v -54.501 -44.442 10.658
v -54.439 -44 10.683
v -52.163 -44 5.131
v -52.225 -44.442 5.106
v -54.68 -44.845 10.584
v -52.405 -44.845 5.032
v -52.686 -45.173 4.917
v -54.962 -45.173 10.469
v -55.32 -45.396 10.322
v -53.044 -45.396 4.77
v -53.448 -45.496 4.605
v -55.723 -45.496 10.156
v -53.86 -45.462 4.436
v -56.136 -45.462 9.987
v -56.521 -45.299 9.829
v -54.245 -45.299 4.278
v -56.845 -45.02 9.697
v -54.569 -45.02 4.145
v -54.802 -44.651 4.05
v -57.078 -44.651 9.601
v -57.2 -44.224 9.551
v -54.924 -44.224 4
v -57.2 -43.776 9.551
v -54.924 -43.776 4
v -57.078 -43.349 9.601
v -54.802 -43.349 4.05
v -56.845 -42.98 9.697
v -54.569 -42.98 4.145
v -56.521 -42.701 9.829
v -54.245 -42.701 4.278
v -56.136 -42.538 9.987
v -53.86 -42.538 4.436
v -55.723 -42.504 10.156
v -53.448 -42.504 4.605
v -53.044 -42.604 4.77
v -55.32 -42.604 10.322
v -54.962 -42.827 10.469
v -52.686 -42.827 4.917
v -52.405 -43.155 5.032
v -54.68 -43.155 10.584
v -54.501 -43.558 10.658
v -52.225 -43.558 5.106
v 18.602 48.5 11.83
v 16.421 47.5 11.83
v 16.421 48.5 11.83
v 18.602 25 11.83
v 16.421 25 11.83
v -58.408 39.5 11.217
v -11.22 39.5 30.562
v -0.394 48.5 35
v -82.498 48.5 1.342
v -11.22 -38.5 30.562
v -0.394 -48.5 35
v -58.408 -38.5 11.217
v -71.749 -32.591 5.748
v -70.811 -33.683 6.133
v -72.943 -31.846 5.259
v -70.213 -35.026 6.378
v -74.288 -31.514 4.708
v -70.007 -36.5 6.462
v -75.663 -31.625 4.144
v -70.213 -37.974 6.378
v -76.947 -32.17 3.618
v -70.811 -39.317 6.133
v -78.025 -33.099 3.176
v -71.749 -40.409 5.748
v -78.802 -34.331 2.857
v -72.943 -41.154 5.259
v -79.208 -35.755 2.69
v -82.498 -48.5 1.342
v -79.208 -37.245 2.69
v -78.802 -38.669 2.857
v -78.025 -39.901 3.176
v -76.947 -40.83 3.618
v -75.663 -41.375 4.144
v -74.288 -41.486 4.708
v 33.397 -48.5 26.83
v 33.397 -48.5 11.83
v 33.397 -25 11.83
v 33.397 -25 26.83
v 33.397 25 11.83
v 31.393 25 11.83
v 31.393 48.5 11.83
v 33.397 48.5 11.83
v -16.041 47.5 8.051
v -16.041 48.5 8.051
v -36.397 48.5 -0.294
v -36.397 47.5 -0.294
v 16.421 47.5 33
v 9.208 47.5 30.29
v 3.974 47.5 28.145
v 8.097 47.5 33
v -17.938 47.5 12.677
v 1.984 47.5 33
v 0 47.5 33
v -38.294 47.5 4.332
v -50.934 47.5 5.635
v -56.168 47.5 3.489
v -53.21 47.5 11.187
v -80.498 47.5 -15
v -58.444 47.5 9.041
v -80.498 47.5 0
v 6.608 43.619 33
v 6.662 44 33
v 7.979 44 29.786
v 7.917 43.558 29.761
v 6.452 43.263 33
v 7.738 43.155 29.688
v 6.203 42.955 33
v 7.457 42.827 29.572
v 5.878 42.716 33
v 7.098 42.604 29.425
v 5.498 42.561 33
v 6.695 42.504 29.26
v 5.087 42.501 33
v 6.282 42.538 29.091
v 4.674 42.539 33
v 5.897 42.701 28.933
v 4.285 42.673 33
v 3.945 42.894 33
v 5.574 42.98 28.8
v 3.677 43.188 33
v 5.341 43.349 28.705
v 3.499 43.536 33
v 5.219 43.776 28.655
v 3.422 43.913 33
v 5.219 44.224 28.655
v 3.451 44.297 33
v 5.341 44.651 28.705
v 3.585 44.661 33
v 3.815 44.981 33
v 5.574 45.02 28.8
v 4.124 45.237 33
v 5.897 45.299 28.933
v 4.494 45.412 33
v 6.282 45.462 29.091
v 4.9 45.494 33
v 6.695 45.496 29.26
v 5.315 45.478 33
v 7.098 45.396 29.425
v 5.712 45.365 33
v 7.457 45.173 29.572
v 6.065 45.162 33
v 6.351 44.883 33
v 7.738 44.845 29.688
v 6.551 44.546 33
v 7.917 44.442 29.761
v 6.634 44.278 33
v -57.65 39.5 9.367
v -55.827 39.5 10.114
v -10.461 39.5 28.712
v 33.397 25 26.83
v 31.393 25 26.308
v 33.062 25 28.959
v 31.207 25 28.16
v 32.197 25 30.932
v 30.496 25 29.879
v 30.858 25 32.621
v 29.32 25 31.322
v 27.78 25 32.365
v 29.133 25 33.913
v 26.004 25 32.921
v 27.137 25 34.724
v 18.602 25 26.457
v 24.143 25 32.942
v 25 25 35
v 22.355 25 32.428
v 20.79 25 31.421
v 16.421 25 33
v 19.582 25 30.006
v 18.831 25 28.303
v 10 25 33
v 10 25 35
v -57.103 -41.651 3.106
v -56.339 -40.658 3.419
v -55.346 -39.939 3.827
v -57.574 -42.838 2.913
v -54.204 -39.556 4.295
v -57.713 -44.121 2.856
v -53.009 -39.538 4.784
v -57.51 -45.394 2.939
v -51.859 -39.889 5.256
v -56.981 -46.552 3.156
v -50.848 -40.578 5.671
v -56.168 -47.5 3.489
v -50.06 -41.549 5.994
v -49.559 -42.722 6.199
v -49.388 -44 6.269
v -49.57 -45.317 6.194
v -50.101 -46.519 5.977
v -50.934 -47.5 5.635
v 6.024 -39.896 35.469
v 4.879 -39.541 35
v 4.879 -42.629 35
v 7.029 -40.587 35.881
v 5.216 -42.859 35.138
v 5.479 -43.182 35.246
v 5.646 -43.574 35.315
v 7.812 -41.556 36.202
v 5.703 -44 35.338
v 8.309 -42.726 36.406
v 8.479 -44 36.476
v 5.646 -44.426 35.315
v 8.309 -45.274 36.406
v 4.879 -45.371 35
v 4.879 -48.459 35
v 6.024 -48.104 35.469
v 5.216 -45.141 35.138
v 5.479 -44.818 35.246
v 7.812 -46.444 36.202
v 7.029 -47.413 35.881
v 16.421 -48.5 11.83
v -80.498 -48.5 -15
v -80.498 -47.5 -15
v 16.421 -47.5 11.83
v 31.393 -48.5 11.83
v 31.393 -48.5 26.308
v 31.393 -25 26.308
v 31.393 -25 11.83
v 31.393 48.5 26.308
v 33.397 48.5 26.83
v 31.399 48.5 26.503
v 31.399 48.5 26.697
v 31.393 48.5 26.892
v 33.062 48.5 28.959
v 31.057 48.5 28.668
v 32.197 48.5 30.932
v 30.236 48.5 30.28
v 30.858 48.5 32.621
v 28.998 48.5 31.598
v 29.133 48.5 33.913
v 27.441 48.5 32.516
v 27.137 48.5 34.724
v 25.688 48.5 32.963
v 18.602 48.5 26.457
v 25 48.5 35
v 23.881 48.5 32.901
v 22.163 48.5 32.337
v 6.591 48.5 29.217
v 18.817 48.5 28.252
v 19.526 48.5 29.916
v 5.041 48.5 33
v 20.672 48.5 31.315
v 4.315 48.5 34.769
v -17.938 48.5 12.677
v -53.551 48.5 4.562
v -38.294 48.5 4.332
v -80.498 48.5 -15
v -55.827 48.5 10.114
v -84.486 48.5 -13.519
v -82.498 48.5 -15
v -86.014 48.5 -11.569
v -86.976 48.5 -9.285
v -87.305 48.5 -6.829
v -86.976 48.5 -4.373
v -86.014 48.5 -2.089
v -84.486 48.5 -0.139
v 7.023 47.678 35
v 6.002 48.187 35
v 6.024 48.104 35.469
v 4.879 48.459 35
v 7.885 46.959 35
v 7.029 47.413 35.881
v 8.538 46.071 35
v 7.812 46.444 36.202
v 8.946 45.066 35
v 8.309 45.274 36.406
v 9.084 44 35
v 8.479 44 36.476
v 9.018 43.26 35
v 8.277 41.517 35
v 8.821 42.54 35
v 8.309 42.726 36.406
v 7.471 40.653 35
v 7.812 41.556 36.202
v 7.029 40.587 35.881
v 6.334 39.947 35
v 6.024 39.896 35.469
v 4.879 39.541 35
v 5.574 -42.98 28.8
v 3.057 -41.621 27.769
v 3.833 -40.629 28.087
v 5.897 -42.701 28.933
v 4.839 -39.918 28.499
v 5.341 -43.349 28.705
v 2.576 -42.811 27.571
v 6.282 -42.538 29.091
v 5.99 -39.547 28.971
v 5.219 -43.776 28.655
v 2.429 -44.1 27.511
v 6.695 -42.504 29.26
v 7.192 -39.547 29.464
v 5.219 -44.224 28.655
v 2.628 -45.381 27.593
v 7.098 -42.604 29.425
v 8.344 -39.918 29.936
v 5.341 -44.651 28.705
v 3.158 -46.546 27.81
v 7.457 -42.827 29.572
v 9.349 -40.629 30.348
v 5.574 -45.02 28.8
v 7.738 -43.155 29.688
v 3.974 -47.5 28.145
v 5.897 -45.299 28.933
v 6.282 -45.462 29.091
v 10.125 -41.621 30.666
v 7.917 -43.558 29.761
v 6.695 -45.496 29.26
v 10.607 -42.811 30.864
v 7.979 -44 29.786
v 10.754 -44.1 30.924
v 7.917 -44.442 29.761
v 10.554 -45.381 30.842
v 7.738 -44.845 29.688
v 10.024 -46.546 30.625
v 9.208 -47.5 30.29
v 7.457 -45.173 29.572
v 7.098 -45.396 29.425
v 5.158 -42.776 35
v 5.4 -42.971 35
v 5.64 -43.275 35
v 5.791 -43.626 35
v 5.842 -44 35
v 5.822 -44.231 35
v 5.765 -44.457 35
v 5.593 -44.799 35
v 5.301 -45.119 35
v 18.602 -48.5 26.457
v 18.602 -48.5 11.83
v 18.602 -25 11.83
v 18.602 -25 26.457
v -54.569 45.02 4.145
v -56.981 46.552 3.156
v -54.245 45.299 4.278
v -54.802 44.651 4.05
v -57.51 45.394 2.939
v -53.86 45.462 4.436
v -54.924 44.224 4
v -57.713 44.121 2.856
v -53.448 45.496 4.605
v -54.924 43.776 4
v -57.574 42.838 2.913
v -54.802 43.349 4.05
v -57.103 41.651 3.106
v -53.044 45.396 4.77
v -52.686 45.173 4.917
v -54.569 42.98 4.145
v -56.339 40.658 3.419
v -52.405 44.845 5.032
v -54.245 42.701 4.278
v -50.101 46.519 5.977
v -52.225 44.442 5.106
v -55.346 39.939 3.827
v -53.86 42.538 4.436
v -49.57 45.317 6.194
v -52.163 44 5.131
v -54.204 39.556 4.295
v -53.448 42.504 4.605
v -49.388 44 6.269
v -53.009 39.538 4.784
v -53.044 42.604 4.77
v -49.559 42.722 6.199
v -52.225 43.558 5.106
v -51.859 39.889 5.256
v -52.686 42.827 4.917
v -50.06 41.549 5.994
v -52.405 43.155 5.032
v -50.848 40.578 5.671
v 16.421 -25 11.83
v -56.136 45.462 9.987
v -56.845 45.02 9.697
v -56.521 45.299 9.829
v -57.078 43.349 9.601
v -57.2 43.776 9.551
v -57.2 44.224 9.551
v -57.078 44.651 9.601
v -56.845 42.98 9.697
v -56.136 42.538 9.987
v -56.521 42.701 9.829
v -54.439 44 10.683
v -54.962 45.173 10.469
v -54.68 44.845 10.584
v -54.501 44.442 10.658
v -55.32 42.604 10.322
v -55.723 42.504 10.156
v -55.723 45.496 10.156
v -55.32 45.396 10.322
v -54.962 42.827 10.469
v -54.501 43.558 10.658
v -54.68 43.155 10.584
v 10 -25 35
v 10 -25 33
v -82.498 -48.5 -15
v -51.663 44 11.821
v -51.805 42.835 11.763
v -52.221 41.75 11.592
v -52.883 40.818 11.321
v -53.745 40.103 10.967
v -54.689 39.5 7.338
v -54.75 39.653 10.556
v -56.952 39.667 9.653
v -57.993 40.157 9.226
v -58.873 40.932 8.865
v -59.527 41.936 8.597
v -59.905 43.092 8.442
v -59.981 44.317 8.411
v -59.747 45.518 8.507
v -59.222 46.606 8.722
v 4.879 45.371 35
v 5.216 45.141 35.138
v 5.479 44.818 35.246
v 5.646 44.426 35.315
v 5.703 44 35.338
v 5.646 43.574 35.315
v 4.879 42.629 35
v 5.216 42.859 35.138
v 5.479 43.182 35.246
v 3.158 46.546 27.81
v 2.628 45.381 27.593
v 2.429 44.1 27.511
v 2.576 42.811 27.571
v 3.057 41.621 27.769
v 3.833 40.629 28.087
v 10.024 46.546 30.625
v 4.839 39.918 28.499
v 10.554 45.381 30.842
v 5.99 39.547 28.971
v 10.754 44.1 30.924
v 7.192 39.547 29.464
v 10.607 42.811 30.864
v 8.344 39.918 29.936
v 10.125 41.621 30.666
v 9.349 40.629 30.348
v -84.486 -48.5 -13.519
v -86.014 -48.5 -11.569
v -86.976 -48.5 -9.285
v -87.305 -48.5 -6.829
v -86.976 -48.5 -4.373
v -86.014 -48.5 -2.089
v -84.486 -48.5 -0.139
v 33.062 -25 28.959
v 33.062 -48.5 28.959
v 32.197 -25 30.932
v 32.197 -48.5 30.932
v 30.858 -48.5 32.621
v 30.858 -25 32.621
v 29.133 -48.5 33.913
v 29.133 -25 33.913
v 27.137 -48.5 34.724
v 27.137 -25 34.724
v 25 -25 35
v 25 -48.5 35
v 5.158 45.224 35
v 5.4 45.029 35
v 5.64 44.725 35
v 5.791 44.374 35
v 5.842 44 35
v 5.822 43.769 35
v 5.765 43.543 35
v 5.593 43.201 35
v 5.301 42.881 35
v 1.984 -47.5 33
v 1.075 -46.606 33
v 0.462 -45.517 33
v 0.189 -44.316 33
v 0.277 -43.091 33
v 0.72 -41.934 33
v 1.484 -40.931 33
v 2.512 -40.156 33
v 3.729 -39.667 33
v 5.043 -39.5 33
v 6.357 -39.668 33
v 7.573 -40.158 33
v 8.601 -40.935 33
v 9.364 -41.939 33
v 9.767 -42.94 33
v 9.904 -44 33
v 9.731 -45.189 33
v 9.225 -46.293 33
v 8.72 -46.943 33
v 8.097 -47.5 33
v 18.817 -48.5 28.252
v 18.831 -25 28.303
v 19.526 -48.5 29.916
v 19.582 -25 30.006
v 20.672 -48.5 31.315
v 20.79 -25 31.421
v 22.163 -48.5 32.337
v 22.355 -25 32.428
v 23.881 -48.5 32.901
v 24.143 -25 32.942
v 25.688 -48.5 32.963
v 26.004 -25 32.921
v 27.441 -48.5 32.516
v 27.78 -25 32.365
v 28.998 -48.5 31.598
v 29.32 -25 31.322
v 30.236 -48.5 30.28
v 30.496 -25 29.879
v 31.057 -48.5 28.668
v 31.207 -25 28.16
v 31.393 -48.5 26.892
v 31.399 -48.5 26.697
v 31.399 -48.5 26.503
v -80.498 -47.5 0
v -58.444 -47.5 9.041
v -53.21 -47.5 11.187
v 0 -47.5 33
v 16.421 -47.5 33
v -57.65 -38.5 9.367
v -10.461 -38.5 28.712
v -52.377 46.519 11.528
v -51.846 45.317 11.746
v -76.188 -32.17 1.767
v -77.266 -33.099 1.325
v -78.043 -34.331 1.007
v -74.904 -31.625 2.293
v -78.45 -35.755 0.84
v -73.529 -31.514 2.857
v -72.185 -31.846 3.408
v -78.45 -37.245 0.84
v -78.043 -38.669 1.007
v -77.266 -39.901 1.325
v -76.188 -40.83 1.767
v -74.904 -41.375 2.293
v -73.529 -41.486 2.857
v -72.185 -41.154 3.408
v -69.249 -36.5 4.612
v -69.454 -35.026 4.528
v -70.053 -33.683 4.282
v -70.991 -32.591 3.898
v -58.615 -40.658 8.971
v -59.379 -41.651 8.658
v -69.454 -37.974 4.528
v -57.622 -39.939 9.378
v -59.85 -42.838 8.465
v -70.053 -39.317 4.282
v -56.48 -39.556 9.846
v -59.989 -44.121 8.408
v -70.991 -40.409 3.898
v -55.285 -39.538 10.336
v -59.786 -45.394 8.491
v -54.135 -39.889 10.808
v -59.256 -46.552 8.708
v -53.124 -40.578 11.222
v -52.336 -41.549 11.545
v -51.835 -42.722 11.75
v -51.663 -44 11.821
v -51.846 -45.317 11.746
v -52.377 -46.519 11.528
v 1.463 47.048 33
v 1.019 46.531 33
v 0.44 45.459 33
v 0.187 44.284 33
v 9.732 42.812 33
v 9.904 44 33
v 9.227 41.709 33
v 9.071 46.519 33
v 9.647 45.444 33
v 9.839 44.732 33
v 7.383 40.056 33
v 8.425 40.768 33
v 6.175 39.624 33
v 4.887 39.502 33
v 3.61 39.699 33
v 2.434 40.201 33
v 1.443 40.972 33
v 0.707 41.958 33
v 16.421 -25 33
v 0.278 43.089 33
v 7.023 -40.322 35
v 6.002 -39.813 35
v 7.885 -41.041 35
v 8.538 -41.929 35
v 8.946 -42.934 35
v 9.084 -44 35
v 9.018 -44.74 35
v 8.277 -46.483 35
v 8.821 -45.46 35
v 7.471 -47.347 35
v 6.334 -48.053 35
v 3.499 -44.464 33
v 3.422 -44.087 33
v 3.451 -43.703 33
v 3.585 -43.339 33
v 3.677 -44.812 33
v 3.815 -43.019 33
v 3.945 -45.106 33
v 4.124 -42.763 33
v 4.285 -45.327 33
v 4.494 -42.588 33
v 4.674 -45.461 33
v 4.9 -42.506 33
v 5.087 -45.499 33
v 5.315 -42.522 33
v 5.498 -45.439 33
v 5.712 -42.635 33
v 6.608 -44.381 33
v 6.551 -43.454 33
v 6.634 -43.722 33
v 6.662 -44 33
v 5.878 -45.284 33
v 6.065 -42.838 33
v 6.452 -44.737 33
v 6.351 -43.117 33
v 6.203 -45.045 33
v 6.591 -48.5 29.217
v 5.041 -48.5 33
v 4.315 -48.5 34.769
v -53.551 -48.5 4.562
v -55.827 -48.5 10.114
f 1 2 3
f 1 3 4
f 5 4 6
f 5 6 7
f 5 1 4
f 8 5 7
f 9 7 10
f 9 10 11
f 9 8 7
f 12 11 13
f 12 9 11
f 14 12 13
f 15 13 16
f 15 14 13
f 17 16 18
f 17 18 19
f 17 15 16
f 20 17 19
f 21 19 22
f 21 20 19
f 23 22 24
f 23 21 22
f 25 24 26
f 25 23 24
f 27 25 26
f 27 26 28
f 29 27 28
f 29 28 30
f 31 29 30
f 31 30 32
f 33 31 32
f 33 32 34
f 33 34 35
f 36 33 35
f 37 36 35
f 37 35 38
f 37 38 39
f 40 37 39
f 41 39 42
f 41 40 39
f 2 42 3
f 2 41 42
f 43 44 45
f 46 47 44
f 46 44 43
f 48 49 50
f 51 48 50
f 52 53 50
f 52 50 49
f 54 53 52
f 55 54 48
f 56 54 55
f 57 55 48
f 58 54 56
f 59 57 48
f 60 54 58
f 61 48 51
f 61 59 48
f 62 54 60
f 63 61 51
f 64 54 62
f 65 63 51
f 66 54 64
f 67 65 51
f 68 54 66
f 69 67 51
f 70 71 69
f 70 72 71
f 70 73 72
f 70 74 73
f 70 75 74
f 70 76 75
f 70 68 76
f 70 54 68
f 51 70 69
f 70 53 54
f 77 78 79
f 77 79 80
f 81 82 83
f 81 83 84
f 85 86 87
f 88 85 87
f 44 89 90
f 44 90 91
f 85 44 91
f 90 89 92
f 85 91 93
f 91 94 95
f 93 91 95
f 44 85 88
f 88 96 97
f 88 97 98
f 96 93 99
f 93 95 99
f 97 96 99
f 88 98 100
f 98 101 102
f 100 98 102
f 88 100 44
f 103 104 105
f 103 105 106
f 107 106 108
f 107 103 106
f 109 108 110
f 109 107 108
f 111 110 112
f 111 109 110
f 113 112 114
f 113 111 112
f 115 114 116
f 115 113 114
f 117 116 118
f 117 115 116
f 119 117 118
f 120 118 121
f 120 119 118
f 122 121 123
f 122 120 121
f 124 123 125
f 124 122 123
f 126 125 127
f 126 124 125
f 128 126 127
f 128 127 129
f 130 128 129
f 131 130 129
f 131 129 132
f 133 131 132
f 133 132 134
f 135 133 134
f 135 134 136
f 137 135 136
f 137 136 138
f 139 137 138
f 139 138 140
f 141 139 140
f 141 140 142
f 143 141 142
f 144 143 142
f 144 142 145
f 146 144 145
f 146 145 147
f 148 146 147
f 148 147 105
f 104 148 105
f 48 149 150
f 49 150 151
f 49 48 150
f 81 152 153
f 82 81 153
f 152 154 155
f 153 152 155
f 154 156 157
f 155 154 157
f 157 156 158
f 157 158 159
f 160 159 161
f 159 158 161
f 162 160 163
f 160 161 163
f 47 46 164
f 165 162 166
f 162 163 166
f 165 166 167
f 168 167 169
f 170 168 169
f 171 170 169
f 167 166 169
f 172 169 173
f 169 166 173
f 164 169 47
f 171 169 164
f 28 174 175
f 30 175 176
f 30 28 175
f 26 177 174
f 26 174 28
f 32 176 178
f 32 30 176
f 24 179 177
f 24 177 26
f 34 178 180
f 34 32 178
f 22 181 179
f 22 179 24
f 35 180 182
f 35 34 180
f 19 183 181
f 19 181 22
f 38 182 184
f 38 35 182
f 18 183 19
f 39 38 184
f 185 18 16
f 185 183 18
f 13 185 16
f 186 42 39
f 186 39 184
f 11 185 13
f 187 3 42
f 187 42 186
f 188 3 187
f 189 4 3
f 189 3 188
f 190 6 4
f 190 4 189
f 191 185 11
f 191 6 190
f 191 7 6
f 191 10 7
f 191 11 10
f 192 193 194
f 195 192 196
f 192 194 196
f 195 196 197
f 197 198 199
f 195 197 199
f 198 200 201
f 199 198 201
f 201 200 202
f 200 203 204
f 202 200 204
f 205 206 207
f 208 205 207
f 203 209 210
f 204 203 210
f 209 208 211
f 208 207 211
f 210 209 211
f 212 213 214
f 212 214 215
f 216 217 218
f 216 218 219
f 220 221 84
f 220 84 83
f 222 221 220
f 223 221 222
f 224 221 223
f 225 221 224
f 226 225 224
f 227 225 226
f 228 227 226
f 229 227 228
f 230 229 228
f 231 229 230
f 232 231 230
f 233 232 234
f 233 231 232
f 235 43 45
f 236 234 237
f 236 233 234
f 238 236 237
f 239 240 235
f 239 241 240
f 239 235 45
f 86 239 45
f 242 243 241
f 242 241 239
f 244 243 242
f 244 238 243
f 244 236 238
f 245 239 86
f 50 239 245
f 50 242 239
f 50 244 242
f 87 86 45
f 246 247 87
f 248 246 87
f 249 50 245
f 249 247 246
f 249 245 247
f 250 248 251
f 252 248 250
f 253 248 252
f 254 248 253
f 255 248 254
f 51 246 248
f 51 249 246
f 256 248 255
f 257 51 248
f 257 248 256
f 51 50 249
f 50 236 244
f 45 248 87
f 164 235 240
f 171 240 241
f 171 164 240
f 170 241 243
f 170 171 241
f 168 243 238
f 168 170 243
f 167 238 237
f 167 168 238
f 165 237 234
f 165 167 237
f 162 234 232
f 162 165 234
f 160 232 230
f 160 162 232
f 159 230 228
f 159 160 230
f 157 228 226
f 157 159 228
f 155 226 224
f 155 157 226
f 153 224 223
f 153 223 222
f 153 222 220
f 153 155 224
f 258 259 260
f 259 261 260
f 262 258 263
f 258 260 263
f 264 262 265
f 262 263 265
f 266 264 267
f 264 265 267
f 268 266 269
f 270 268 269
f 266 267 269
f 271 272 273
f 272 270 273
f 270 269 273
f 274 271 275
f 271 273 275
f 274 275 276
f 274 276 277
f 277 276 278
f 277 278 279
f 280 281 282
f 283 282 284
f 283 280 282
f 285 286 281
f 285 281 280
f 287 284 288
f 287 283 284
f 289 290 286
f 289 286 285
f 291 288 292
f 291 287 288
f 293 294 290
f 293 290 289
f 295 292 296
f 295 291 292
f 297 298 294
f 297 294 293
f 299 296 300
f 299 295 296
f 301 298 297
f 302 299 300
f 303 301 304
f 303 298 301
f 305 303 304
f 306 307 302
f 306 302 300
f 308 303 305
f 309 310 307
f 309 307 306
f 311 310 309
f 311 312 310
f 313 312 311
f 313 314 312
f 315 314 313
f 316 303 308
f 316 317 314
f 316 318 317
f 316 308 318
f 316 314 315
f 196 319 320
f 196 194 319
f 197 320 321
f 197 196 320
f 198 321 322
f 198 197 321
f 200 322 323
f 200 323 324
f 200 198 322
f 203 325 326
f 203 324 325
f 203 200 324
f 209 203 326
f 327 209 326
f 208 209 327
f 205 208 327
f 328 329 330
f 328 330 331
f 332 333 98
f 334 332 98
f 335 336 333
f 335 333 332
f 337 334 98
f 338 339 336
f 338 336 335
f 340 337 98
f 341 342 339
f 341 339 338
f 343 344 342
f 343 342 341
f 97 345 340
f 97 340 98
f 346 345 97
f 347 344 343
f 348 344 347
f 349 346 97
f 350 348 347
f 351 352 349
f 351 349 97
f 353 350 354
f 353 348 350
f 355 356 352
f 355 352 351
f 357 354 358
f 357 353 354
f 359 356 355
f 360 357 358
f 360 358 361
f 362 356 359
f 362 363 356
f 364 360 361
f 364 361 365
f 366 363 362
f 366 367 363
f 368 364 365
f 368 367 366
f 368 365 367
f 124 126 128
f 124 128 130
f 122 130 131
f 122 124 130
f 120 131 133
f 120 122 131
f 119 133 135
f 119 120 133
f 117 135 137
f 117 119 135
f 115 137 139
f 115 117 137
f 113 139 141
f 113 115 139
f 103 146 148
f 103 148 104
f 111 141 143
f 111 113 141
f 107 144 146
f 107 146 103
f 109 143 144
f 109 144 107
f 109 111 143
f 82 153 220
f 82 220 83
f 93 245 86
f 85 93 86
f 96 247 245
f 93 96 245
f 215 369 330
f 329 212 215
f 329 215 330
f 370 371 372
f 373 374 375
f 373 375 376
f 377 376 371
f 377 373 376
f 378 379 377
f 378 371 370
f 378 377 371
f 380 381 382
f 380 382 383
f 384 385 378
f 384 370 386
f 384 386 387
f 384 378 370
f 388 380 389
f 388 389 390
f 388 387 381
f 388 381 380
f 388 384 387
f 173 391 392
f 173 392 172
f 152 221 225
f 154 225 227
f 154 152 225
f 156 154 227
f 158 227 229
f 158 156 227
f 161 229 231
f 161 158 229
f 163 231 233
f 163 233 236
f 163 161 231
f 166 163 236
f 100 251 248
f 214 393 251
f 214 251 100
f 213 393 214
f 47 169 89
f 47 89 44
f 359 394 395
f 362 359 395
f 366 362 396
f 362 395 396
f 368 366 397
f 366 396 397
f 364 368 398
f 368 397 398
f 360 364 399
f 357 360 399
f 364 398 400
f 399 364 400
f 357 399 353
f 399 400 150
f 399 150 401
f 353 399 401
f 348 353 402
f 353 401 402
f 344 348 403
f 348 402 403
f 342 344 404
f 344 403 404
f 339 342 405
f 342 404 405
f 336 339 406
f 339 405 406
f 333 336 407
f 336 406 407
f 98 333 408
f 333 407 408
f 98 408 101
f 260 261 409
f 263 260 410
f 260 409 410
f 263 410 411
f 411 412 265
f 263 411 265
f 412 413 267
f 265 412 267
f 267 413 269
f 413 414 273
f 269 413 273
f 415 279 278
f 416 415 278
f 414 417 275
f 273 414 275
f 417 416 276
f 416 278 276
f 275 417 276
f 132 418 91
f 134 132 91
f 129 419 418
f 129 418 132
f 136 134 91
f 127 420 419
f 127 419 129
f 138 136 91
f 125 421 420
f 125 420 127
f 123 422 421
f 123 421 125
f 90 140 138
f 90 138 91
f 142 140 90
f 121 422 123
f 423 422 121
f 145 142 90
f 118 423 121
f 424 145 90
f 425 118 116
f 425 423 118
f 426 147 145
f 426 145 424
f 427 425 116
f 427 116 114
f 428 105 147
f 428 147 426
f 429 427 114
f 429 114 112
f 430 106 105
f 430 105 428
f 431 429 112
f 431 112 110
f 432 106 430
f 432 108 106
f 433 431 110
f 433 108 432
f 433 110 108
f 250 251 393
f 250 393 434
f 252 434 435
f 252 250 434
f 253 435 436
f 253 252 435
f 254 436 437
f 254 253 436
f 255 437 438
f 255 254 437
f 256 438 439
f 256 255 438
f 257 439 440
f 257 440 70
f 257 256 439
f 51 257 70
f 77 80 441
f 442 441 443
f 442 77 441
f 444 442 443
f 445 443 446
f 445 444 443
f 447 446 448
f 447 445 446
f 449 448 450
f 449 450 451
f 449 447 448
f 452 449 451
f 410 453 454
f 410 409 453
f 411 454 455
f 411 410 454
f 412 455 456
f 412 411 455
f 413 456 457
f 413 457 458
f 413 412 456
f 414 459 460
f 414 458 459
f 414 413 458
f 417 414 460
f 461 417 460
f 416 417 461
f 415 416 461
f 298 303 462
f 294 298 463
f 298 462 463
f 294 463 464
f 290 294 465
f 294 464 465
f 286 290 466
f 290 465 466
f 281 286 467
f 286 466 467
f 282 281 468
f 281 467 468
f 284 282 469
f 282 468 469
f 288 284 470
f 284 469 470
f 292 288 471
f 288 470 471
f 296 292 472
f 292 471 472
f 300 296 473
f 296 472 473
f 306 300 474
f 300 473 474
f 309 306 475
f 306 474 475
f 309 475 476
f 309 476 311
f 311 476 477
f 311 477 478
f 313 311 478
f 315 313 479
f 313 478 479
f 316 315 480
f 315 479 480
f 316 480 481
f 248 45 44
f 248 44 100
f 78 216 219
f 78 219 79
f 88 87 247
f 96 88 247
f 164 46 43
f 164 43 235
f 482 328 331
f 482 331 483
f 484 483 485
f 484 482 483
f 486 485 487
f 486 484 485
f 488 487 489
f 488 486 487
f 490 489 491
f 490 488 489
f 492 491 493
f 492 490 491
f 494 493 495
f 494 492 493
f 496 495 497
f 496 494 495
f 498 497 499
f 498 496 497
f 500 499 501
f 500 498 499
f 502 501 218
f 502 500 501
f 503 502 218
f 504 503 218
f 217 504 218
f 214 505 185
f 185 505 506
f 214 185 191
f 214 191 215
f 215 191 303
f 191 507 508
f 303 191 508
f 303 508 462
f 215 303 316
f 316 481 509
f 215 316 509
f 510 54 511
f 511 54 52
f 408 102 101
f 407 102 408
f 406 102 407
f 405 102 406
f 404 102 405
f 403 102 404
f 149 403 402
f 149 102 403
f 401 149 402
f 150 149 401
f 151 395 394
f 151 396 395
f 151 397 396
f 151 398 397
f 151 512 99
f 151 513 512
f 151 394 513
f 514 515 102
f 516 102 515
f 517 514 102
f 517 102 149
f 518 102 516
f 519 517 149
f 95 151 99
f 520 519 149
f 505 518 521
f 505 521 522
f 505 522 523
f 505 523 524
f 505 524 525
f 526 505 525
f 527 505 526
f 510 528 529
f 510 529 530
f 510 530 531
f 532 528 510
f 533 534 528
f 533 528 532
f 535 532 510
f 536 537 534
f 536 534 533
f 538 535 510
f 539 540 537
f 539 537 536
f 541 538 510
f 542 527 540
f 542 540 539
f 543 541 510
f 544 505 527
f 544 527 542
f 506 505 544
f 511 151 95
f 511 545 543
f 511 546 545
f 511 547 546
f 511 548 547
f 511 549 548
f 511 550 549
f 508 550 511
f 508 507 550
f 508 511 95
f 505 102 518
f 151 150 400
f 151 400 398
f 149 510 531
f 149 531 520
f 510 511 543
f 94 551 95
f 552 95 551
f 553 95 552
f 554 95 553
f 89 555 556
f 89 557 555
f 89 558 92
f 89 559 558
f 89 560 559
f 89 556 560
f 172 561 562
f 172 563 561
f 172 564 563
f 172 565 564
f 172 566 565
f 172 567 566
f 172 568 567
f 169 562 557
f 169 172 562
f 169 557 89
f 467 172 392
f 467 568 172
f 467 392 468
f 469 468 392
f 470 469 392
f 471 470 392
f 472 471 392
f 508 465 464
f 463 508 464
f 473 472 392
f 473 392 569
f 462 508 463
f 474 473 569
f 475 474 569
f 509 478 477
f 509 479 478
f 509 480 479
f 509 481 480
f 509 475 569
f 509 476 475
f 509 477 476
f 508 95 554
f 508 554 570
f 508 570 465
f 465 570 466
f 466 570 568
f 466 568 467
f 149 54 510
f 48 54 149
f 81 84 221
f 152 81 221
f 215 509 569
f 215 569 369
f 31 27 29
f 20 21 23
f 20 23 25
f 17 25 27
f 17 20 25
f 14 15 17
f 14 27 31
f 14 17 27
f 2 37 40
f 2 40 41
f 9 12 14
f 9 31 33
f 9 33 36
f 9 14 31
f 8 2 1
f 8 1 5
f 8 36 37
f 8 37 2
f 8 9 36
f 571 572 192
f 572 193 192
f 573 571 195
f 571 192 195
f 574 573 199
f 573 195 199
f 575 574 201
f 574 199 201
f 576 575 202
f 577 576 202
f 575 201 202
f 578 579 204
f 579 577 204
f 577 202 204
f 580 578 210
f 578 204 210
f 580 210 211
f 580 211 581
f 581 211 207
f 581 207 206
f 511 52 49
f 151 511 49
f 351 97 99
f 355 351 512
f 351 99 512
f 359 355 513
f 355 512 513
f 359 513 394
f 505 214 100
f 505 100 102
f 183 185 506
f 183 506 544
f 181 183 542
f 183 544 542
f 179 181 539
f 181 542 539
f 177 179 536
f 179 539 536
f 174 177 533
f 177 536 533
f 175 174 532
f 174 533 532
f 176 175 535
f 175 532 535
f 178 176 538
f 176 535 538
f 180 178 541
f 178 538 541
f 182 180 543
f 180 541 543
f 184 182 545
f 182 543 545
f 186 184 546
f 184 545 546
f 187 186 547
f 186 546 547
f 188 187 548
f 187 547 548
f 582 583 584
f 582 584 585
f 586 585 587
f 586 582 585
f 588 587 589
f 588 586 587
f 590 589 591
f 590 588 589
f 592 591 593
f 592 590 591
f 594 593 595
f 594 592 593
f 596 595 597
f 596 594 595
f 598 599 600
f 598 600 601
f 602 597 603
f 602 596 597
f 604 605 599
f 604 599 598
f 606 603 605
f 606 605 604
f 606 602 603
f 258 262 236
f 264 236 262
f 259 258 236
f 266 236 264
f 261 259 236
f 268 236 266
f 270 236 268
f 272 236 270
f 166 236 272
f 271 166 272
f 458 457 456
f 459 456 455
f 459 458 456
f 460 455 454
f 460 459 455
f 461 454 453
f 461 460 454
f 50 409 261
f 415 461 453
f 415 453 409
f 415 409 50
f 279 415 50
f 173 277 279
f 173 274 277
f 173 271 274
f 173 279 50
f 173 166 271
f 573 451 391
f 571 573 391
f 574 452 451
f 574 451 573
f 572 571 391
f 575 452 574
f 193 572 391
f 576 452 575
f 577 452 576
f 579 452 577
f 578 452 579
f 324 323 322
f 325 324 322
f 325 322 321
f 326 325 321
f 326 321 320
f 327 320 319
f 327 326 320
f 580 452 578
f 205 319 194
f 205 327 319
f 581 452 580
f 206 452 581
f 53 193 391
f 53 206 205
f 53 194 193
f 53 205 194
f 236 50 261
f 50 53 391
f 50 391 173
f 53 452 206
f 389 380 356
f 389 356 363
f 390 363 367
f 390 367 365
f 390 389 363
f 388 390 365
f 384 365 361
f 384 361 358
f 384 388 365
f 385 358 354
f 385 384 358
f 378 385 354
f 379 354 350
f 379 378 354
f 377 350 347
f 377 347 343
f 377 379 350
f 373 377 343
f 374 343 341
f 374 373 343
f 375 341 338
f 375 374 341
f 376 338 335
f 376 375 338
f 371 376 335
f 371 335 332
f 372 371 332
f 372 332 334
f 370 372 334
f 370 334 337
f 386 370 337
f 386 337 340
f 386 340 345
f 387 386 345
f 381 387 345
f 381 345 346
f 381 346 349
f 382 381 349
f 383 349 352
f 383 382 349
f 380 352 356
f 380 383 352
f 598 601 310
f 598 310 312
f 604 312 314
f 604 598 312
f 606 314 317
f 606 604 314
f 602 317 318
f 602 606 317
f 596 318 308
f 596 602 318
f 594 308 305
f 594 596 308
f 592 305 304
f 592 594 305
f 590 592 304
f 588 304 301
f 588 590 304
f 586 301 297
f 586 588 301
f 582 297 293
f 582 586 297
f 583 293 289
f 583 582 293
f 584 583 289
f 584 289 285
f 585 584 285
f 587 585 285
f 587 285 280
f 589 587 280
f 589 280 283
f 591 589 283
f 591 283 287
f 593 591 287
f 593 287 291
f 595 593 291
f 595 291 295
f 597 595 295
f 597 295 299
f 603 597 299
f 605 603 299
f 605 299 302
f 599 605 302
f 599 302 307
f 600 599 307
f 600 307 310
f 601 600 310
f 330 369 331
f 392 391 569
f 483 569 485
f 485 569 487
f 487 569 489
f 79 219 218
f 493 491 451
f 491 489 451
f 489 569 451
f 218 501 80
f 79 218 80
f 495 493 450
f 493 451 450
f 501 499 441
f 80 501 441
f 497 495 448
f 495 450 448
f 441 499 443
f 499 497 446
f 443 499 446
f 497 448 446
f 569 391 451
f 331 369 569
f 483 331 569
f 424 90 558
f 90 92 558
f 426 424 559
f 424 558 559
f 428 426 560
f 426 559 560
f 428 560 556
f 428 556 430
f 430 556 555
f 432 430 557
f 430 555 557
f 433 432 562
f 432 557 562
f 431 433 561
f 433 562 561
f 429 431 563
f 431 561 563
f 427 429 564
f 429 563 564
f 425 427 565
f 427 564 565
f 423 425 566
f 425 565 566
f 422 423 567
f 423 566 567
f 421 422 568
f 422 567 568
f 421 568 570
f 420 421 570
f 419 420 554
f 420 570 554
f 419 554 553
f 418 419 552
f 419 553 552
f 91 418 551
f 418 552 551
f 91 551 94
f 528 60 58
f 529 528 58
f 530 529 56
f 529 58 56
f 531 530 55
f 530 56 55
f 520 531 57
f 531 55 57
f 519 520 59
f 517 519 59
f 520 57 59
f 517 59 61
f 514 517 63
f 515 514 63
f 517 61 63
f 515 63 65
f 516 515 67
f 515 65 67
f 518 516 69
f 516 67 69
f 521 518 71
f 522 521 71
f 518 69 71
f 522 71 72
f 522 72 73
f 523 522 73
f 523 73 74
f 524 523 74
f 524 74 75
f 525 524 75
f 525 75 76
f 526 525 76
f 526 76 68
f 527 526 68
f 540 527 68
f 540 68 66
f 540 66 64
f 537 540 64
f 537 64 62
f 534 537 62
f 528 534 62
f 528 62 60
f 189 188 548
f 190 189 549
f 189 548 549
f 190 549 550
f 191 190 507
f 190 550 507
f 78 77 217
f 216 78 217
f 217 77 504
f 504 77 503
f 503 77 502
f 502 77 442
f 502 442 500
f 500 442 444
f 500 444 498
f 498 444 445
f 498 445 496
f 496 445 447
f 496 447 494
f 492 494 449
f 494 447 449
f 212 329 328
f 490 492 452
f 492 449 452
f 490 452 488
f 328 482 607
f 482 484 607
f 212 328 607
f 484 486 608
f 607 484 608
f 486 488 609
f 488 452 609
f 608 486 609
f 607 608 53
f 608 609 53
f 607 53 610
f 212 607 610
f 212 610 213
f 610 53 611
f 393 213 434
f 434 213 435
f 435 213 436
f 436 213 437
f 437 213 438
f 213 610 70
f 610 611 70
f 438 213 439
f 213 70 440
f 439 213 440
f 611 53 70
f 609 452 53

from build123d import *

# Parameters (mm, degrees)
F1_DEPTH  = 48.5
F2_R      = 4.5
F2_R_2    = 1.5
F3_DEPTH  = 6
F4_W      = 51
F4_H      = 78
F4_R      = 5
F5_DEPTH  = 5
F7_DEPTH  = 1
F9_DEPTH  = 1
F11_DEPTH = 97
F12_DEPTH = 97
F13_W     = 15
F13_H     = 50
F14_DEPTH = 30
F16_DEPTH = 2


with BuildPart() as f1:
    # F0 (on Front) → F1 (new body, symmetric)
    with BuildSketch(Plane.XZ):
        with BuildLine():
            Line((-80.49844719, 0), (0, 33))
            Line((0, 33), (16.4209198648, 33))
            Line((16.4209198648, 33), (16.4209198648, 11.8303052739))
            Line((16.4209198648, 11.8303052739), (18.6015999846, 11.8303052739))
            Line((18.6015999846, 11.8303052739), (18.6015999846, 26.4569012833))
            ThreePointArc((18.6015999846, 26.4569012833), (24.7826070747, 32.9963067716), (31.3933508991, 26.8916578155))
            ThreePointArc((31.3933508991, 26.8916578155), (31.4, 26.6), (31.3933508991, 26.3083421845))
            Line((31.3933508991, 26.3083421845), (31.3933508991, 11.8303052739))
            Line((31.3933508991, 11.8303052739), (33.3968422327, 11.8303052739))
            Line((33.3968422327, 11.8303052739), (33.3968422327, 26.3696947261))
            Line((33.3968422327, 26.3696947261), (33.3968422327, 26.8303052739))
            ThreePointArc((33.3968422327, 26.8303052739), (30.8577058521, 32.62057158), (25, 35))
            Line((25, 35), (-0.3940335036, 35))
            Line((-0.3940335036, 35), (-82.49844719, 1.3416407865))
            Line((-82.49844719, 1.3416407865), (-82.49844719, -15))
            Line((-82.49844719, -15), (-80.49844719, -15))
            Line((-80.49844719, -15), (-80.49844719, 0))
        make_face()
    extrude(amount=F1_DEPTH, both=True)

    # F2 (on face) → F3 (join)
    with BuildSketch(Plane(origin=(-11.5818217717, 0, 28.2520808561), x_dir=(0.9252695079, 0, 0.3793103448), z_dir=(0.3793103448, 0, -0.9252695079))):
        with Locations((17.1811336159, 44)):
            Circle(F2_R)
        with Locations((17.1811336159, 44)):
            Circle(F2_R_2, mode=Mode.SUBTRACT)
        with BuildLine():
            ThreePointArc((-43.3188663841, -44), (-51.0008468994, -40.8180194847), (-47.8188663841, -48.5))
            ThreePointArc((-47.8188663841, -48.5), (-44.6368858688, -47.1819805153), (-43.3188663841, -44))
        make_face()
        with Locations((-47.8188663841, -44)):
            Circle(F2_R_2, mode=Mode.SUBTRACT)
        with BuildLine():
            ThreePointArc((-47.8188663841, 48.5), (-51.0008468994, 40.8180194847), (-43.3188663841, 44))
            ThreePointArc((-43.3188663841, 44), (-44.6368858688, 47.1819805153), (-47.8188663841, 48.5))
        make_face()
        with Locations((-47.8188663841, 44)):
            Circle(F2_R_2, mode=Mode.SUBTRACT)
        with Locations((17.1811336159, -44)):
            Circle(F2_R)
        with Locations((17.1811336159, -44)):
            Circle(F2_R_2, mode=Mode.SUBTRACT)
    extrude(amount=F3_DEPTH)

    # F4 (on face) → F5 (cut)
    with BuildSketch(Plane(origin=(-12.3404424613, 0, 30.102619872), x_dir=(0.9252695079, 0, 0.3793103448), z_dir=(-0.3793103448, 0, 0.9252695079))):
        with Locations((-24.2887251171, 0.5)):
            Rectangle(F4_W, F4_H)
        with Locations((-67.3243994072, -36.5)):
            Circle(F4_R)
    extrude(amount=-F5_DEPTH, mode=Mode.SUBTRACT)

    # F6 (on face) → F7 (join)
    with BuildSketch(Plane.XZ.offset(48.5)):
        Polygon((-80.49844719, -15), (16.4209198648, 11.8303052739), (16.4209198648, 33), (5.040577039, 33), (0, 33), (-55.8271606545, 10.1138901941), (-80.49844719, 0), align=None)
    extrude(amount=-F7_DEPTH)

    # F8 (on face) → F9 (join)
    with BuildSketch(Plane(origin=(0, 48.5, 0), x_dir=(-1, 0, 0), z_dir=(0, 1, 0))):
        Polygon((-16.4209198648, 11.8303052739), (80.49844719, -15), (80.49844719, 0), (55.8271607407, 10.1138901587), (0, 33), (-5.040577039, 33), (-16.4209198648, 33), align=None)
    extrude(amount=-F9_DEPTH)

    # F10 (on face) → F11 (join)
    with BuildSketch(Plane(origin=(0, 48.5, 0), x_dir=(-1, 0, 0), z_dir=(0, 1, 0))):
        with BuildLine():
            Line((82.49844719, -13.8338189837), (82.49844719, -15))
            ThreePointArc((82.49844719, -15), (87.3045087217, -6.8291796068), (82.49844719, 1.3416407865))
            Line((82.49844719, 1.3416407865), (82.49844719, 0.1754597702))
            ThreePointArc((82.49844719, 0.1754597702), (86.3045087217, -6.8291796068), (82.49844719, -13.8338189837))
        make_face()
    extrude(amount=-F11_DEPTH)

    # F10 (on face) → F12 (join)
    with BuildSketch(Plane(origin=(0, 48.5, 0), x_dir=(-1, 0, 0), z_dir=(0, 1, 0))):
        with BuildLine():
            Line((82.49844719, 0.1754597702), (82.49844719, -13.8338189837))
            ThreePointArc((82.49844719, -13.8338189837), (86.3045087217, -6.8291796068), (82.49844719, 0.1754597702))
        make_face()
    extrude(amount=-F12_DEPTH)

    # F13 (on face) → F14 (cut)
    with BuildSketch(Plane.XY.offset(35)):
        with Locations((17.5, 0)):
            Rectangle(F13_W, F13_H)
        with Locations((32.5, 0)):
            Rectangle(F13_W, F13_H)
    extrude(amount=-F14_DEPTH, mode=Mode.SUBTRACT)

    # F15 (on face) → F16 (cut)
    with BuildSketch(Plane(origin=(0, 48.5, 0), x_dir=(-1, 0, 0), z_dir=(0, 1, 0))):
        Polygon((38.2937746964, 4.3324337855), (17.9378455219, 12.6772613717), (16.0412937978, 8.0509138321), (36.3972229723, -0.2939137541), align=None)
    extrude(amount=-F16_DEPTH, mode=Mode.SUBTRACT)


solid = f1.part
